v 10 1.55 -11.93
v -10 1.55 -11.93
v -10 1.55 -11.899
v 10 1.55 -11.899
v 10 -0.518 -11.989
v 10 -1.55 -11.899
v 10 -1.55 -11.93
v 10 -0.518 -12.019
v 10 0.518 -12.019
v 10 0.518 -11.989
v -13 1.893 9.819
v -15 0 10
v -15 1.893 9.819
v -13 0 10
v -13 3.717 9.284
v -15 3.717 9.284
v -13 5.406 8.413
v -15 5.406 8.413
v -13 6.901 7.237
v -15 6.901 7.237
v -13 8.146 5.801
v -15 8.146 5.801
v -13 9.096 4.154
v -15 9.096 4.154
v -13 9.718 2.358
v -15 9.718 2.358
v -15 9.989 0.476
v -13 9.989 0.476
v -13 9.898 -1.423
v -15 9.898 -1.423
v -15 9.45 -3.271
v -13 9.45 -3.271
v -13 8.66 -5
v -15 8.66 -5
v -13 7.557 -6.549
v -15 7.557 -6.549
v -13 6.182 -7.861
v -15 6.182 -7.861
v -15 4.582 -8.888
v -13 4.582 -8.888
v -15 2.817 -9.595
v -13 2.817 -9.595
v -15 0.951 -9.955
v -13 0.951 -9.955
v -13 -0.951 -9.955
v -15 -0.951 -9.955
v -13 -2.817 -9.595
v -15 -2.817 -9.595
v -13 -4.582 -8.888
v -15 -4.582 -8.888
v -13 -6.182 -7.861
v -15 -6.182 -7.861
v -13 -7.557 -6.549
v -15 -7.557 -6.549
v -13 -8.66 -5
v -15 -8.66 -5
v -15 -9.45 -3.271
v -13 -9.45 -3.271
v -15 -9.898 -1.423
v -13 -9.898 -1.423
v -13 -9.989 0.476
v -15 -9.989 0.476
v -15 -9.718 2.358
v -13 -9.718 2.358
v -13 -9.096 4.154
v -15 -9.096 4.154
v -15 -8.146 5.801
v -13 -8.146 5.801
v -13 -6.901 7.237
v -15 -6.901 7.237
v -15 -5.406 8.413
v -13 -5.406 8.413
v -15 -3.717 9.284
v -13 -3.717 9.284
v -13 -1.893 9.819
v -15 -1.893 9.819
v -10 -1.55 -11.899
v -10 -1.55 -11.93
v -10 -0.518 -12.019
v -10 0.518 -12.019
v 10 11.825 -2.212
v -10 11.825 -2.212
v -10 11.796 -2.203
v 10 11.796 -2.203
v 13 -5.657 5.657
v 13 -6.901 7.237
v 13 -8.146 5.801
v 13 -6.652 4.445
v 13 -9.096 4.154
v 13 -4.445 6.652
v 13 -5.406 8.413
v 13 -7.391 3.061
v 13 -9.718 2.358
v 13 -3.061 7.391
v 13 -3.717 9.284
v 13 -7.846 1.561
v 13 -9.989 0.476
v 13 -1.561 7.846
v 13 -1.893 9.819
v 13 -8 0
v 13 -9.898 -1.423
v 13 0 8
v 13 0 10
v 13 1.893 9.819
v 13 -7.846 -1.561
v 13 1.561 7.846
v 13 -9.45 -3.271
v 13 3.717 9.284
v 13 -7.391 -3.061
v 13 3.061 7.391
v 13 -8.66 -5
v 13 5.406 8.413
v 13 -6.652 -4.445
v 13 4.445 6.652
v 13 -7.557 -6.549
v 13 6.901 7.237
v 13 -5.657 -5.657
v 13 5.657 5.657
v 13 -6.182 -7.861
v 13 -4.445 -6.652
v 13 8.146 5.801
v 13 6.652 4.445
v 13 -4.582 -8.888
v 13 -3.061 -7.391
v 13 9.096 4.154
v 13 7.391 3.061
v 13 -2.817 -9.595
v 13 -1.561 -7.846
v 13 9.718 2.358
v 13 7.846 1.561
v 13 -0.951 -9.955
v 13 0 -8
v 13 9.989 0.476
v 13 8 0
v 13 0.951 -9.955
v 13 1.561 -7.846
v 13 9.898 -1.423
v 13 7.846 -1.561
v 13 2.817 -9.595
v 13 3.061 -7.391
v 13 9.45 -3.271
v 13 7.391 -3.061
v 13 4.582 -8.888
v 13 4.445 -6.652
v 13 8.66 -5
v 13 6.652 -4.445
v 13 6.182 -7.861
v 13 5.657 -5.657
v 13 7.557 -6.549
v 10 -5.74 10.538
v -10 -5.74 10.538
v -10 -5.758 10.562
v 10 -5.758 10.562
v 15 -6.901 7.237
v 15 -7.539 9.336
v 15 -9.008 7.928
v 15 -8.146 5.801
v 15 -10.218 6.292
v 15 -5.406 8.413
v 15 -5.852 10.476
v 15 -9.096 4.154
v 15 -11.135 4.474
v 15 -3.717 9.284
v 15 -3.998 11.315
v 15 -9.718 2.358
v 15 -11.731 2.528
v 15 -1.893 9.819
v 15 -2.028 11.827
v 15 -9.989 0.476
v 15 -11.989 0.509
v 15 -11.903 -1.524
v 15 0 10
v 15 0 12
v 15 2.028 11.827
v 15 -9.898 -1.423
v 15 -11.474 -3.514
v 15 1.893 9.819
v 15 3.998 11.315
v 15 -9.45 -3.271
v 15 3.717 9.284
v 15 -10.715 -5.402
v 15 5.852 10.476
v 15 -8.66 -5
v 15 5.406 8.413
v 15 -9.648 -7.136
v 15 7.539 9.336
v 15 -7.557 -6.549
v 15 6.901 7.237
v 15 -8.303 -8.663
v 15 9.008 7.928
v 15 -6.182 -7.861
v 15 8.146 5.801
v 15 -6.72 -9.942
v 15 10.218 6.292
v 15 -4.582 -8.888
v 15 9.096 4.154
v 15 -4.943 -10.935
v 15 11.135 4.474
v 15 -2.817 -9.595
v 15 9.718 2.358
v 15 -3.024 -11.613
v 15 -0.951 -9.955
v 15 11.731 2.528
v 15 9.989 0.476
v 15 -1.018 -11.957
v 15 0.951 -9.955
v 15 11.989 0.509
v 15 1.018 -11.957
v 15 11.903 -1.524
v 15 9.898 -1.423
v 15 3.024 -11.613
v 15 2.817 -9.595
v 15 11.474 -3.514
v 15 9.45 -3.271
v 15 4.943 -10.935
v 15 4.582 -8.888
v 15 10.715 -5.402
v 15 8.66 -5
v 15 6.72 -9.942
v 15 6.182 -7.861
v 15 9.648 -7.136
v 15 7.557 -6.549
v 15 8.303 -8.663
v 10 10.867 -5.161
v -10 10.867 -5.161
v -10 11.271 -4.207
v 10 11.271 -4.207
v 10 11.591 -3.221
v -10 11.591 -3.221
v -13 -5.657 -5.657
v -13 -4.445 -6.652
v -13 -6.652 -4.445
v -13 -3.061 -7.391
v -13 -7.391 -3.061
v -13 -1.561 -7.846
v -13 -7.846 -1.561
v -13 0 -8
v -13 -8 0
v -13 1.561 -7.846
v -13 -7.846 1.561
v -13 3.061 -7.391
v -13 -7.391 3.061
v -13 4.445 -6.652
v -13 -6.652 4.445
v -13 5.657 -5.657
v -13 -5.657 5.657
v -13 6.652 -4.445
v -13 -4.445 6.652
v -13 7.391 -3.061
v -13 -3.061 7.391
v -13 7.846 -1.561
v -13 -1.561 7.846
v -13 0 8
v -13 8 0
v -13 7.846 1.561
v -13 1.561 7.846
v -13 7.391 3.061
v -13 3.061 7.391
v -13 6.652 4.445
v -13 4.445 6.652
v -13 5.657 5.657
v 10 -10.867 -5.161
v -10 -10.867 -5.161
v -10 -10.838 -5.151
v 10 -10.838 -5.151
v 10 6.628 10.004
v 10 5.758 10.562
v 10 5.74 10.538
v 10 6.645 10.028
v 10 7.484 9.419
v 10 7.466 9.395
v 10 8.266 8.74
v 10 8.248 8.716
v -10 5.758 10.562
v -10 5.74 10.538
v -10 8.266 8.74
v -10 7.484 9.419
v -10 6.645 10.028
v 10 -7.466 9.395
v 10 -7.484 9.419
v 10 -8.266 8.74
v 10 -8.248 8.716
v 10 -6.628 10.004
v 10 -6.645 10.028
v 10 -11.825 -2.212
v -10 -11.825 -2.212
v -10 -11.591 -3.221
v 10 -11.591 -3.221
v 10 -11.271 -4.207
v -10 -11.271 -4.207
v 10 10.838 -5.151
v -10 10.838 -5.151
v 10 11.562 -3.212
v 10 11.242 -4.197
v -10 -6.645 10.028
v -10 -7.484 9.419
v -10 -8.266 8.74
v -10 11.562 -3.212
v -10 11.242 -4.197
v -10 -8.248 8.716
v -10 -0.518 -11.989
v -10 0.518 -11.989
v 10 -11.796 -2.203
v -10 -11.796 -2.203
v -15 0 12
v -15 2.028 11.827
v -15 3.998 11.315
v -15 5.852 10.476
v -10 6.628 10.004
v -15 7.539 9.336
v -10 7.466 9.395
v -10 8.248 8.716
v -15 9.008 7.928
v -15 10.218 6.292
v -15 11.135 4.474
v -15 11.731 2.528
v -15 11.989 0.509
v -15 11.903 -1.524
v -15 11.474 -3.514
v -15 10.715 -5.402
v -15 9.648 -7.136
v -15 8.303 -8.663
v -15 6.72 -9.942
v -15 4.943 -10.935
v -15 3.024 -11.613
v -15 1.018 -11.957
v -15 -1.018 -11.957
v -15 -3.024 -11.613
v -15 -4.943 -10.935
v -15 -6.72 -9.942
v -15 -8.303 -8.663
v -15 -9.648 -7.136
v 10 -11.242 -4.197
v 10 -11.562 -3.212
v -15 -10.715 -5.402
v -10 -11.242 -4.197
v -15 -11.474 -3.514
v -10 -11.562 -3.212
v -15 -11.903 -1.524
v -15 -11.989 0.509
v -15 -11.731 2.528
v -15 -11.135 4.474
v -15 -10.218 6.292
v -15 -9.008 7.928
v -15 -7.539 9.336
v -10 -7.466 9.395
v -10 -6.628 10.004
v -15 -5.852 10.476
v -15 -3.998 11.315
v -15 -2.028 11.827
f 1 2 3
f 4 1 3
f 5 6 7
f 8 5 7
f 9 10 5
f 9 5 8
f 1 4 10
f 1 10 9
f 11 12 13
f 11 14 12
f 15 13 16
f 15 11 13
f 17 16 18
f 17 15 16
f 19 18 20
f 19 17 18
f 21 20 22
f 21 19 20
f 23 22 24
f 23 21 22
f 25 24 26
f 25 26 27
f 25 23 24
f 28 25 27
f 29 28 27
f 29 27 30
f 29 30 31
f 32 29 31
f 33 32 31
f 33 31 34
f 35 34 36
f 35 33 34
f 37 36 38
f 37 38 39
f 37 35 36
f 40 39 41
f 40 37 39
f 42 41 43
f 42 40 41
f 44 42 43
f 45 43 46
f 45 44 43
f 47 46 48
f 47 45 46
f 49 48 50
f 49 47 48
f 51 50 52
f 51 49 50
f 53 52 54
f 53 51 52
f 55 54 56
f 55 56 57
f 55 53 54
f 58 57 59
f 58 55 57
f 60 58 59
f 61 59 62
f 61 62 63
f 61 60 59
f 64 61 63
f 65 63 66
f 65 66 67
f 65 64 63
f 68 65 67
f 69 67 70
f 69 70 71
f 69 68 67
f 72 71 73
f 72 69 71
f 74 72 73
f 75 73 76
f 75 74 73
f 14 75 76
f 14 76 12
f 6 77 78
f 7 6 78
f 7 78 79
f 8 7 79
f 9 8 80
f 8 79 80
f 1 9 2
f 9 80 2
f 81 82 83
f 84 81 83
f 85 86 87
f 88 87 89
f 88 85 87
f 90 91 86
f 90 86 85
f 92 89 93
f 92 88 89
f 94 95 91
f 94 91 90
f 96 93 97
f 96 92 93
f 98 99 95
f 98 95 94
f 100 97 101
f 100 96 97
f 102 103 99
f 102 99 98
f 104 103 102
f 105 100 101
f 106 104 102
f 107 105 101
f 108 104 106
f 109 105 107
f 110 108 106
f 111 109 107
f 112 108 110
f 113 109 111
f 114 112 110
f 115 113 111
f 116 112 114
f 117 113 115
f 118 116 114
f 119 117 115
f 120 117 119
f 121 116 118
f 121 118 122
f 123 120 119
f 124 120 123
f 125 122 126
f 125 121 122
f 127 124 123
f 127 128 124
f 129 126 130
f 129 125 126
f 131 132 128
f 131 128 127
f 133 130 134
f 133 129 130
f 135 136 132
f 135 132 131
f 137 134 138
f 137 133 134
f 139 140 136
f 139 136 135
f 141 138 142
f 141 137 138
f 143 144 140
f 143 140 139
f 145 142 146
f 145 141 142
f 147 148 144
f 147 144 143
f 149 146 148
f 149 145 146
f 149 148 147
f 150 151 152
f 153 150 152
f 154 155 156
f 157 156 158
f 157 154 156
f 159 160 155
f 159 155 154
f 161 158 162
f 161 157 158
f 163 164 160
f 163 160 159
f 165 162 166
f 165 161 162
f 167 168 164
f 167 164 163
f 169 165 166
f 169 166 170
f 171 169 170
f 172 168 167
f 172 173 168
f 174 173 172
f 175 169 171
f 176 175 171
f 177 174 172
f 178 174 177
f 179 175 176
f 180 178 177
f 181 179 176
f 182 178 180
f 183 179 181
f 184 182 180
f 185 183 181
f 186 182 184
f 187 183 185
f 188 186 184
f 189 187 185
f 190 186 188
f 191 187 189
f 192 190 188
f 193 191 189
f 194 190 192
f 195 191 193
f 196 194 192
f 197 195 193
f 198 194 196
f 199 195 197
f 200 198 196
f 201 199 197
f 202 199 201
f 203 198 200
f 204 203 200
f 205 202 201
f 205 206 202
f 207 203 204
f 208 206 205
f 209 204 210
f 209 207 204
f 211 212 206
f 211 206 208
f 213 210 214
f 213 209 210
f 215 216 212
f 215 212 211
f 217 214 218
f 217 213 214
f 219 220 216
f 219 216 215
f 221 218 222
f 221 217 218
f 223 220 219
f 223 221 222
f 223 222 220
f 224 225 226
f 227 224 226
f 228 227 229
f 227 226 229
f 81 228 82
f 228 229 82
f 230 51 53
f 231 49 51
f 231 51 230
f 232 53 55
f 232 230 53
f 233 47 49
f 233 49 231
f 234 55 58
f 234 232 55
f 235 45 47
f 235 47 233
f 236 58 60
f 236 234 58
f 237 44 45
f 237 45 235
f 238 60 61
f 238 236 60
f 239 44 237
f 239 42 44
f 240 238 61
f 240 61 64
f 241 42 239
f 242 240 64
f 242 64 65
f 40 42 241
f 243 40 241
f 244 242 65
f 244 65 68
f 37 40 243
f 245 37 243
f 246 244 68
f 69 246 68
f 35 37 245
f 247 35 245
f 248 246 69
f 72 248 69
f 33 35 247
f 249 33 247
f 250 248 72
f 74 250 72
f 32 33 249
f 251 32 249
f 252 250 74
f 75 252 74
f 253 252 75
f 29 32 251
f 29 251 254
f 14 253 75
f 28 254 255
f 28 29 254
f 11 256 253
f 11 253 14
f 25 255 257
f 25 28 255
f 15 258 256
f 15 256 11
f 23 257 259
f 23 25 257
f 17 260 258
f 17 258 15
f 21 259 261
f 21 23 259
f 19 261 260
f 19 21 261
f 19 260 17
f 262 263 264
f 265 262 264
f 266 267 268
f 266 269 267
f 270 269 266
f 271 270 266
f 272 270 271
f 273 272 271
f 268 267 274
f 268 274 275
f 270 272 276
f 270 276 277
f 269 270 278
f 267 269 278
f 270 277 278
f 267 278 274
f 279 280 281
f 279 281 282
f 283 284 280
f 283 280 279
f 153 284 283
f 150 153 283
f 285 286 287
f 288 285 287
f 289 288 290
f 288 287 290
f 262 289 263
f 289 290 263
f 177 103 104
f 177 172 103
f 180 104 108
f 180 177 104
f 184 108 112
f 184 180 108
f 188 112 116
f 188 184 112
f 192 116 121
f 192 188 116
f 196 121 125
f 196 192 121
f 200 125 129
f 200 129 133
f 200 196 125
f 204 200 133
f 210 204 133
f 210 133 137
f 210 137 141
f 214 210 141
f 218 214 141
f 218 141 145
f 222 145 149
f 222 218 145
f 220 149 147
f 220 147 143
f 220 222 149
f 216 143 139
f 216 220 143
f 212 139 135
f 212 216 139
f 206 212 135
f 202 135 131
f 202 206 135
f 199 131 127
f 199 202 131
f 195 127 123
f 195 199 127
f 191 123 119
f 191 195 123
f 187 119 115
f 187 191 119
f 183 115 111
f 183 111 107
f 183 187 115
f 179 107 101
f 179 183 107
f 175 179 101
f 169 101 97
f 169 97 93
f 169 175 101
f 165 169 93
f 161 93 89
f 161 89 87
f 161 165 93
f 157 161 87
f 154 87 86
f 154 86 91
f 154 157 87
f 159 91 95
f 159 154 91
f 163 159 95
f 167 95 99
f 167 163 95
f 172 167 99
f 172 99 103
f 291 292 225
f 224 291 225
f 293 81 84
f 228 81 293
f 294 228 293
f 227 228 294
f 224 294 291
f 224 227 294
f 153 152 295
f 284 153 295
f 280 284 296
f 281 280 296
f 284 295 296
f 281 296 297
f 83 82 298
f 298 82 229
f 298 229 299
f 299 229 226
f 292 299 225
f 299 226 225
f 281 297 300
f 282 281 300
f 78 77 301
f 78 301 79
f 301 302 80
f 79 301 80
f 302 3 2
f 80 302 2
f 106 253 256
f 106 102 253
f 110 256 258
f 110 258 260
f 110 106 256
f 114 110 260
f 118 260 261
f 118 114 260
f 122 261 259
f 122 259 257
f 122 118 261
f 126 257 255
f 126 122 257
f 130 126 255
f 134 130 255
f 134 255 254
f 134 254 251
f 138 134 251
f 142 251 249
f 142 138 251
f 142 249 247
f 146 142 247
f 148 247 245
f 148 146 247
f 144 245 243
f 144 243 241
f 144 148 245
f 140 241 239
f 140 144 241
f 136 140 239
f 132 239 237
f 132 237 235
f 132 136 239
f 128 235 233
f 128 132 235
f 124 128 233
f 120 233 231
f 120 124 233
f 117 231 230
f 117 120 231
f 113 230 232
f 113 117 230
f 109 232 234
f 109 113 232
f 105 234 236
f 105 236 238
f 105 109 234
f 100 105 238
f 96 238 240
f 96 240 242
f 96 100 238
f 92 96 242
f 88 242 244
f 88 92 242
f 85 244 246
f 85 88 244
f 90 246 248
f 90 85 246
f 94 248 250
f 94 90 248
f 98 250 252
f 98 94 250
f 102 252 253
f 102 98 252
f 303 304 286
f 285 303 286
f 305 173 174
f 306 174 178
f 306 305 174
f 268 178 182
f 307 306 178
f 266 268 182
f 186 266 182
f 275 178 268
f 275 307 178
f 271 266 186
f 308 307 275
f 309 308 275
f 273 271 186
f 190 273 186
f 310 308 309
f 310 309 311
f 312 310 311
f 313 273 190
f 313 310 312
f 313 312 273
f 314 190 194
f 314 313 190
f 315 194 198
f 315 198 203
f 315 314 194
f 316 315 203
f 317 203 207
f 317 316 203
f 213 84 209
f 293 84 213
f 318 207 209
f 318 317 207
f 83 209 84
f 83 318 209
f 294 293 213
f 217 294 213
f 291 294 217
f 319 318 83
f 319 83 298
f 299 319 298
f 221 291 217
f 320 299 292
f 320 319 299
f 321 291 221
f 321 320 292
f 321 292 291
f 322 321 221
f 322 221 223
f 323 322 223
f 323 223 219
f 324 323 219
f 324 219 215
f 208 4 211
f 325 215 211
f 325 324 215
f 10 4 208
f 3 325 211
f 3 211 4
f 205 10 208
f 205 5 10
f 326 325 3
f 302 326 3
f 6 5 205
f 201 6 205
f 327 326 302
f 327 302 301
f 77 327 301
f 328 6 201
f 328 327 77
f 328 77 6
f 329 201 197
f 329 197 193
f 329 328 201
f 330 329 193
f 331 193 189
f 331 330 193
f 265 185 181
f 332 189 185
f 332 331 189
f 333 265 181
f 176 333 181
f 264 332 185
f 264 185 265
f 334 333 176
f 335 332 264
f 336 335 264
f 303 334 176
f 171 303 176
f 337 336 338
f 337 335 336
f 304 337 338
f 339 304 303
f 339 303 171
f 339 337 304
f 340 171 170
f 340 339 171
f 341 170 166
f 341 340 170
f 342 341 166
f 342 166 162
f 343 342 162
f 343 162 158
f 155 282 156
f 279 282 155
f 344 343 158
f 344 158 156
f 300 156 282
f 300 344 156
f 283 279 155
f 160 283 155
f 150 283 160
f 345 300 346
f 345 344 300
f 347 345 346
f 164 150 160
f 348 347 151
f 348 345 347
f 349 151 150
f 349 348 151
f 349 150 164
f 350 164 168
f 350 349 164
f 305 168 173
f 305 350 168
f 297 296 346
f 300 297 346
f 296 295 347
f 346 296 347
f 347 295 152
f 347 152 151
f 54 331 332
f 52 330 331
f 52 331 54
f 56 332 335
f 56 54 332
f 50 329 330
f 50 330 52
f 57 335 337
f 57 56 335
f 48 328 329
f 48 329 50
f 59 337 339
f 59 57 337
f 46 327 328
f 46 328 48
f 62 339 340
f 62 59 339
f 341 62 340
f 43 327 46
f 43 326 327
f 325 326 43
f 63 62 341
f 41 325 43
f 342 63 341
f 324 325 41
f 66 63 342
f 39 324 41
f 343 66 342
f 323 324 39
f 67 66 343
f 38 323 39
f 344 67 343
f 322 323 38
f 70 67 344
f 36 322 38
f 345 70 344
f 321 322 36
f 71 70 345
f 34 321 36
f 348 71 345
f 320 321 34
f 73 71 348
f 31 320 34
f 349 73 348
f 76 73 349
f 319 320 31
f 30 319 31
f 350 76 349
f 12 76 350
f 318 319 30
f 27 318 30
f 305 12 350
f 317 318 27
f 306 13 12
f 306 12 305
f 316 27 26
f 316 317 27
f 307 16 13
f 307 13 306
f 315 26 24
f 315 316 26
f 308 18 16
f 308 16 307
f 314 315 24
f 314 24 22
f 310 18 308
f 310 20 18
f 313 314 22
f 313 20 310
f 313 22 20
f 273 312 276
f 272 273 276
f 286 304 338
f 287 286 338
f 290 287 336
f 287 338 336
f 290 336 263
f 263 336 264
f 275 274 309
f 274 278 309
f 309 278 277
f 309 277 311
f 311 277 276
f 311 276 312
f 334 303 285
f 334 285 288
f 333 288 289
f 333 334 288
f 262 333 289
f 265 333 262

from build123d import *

# Parameters (mm, degrees)
BOSS_EXTRUDE1_DEPTH      = 10
BOSS_EXTRUDE1_DEPTH_BACK = 10
SKETCH2_R                = 8.5


with BuildPart() as part:
    # Sketch1 → Revolve1 (revolve)
    with BuildSketch(Plane.XY, mode=Mode.PRIVATE) as revolve1_sk:
        Polygon((-15, 10), (-13, 10), (-13, 8), (13, 8), (13, 10), (15, 10), (15, 12), (-15, 12), align=None)
    revolve(revolve1_sk.sketch.rotate(Axis((15, 0, 0), (-1, 0, 0)), 270), axis=Axis((15, 0, 0), (-1, 0, 0)))

    # Sketch2 → Boss-Extrude1 (add, two sides: drawn at the far end of the back side and taken through both)
    with BuildSketch(Plane(origin=(0, 0, 0), x_dir=(0, 0, -1), z_dir=(1, 0, 0)).offset(-BOSS_EXTRUDE1_DEPTH_BACK)):
        with BuildLine():
            Line((-10.129868152, -5.443874651), (-10.562419487, -5.758141591))
            ThreePointArc((-10.562419487, -5.758141591), (-9.732474442, -7.071056585), (-8.740285205, -8.266094273))
            Line((-8.740285205, -8.266094273), (-8.30773387, -7.951827333))
            ThreePointArc((-8.30773387, -7.951827333), (-3.553695435, -10.937149937), (2.047131051, -11.316326898))
            Line((2.047131051, -11.316326898), (2.212350959, -11.824821489))
            ThreePointArc((2.212350959, -11.824821489), (3.717474442, -11.441209891), (5.160626159, -10.866868806))
            Line((5.160626159, -10.866868806), (4.995406251, -10.358374215))
            ThreePointArc((4.995406251, -10.358374215), (9.303695435, -6.759530401), (11.395064721, -1.55))
            Line((11.395064721, -1.55), (11.929727574, -1.55))
            ThreePointArc((11.929727574, -1.55), (12.03, 0), (11.929727574, 1.55))
            Line((11.929727574, 1.55), (11.395064721, 1.55))
            ThreePointArc((11.395064721, 1.55), (9.303695435, 6.759530401), (4.995406251, 10.358374215))
            Line((4.995406251, 10.358374215), (5.160626159, 10.866868806))
            ThreePointArc((5.160626159, 10.866868806), (3.717474442, 11.441209891), (2.212350959, 11.824821489))
            Line((2.212350959, 11.824821489), (2.047131051, 11.316326898))
            ThreePointArc((2.047131051, 11.316326898), (-3.553695435, 10.937149937), (-8.30773387, 7.951827333))
            Line((-8.30773387, 7.951827333), (-8.740285205, 8.266094273))
            ThreePointArc((-8.740285205, 8.266094273), (-9.732474442, 7.071056585), (-10.562419487, 5.758141591))
            Line((-10.562419487, 5.758141591), (-10.129868152, 5.443874651))
            ThreePointArc((-10.129868152, 5.443874651), (-11.5, 0), (-10.129868152, -5.443874651))
        make_face()
        Circle(SKETCH2_R, mode=Mode.SUBTRACT)
    extrude(amount=BOSS_EXTRUDE1_DEPTH + BOSS_EXTRUDE1_DEPTH_BACK)


solid = part.part
